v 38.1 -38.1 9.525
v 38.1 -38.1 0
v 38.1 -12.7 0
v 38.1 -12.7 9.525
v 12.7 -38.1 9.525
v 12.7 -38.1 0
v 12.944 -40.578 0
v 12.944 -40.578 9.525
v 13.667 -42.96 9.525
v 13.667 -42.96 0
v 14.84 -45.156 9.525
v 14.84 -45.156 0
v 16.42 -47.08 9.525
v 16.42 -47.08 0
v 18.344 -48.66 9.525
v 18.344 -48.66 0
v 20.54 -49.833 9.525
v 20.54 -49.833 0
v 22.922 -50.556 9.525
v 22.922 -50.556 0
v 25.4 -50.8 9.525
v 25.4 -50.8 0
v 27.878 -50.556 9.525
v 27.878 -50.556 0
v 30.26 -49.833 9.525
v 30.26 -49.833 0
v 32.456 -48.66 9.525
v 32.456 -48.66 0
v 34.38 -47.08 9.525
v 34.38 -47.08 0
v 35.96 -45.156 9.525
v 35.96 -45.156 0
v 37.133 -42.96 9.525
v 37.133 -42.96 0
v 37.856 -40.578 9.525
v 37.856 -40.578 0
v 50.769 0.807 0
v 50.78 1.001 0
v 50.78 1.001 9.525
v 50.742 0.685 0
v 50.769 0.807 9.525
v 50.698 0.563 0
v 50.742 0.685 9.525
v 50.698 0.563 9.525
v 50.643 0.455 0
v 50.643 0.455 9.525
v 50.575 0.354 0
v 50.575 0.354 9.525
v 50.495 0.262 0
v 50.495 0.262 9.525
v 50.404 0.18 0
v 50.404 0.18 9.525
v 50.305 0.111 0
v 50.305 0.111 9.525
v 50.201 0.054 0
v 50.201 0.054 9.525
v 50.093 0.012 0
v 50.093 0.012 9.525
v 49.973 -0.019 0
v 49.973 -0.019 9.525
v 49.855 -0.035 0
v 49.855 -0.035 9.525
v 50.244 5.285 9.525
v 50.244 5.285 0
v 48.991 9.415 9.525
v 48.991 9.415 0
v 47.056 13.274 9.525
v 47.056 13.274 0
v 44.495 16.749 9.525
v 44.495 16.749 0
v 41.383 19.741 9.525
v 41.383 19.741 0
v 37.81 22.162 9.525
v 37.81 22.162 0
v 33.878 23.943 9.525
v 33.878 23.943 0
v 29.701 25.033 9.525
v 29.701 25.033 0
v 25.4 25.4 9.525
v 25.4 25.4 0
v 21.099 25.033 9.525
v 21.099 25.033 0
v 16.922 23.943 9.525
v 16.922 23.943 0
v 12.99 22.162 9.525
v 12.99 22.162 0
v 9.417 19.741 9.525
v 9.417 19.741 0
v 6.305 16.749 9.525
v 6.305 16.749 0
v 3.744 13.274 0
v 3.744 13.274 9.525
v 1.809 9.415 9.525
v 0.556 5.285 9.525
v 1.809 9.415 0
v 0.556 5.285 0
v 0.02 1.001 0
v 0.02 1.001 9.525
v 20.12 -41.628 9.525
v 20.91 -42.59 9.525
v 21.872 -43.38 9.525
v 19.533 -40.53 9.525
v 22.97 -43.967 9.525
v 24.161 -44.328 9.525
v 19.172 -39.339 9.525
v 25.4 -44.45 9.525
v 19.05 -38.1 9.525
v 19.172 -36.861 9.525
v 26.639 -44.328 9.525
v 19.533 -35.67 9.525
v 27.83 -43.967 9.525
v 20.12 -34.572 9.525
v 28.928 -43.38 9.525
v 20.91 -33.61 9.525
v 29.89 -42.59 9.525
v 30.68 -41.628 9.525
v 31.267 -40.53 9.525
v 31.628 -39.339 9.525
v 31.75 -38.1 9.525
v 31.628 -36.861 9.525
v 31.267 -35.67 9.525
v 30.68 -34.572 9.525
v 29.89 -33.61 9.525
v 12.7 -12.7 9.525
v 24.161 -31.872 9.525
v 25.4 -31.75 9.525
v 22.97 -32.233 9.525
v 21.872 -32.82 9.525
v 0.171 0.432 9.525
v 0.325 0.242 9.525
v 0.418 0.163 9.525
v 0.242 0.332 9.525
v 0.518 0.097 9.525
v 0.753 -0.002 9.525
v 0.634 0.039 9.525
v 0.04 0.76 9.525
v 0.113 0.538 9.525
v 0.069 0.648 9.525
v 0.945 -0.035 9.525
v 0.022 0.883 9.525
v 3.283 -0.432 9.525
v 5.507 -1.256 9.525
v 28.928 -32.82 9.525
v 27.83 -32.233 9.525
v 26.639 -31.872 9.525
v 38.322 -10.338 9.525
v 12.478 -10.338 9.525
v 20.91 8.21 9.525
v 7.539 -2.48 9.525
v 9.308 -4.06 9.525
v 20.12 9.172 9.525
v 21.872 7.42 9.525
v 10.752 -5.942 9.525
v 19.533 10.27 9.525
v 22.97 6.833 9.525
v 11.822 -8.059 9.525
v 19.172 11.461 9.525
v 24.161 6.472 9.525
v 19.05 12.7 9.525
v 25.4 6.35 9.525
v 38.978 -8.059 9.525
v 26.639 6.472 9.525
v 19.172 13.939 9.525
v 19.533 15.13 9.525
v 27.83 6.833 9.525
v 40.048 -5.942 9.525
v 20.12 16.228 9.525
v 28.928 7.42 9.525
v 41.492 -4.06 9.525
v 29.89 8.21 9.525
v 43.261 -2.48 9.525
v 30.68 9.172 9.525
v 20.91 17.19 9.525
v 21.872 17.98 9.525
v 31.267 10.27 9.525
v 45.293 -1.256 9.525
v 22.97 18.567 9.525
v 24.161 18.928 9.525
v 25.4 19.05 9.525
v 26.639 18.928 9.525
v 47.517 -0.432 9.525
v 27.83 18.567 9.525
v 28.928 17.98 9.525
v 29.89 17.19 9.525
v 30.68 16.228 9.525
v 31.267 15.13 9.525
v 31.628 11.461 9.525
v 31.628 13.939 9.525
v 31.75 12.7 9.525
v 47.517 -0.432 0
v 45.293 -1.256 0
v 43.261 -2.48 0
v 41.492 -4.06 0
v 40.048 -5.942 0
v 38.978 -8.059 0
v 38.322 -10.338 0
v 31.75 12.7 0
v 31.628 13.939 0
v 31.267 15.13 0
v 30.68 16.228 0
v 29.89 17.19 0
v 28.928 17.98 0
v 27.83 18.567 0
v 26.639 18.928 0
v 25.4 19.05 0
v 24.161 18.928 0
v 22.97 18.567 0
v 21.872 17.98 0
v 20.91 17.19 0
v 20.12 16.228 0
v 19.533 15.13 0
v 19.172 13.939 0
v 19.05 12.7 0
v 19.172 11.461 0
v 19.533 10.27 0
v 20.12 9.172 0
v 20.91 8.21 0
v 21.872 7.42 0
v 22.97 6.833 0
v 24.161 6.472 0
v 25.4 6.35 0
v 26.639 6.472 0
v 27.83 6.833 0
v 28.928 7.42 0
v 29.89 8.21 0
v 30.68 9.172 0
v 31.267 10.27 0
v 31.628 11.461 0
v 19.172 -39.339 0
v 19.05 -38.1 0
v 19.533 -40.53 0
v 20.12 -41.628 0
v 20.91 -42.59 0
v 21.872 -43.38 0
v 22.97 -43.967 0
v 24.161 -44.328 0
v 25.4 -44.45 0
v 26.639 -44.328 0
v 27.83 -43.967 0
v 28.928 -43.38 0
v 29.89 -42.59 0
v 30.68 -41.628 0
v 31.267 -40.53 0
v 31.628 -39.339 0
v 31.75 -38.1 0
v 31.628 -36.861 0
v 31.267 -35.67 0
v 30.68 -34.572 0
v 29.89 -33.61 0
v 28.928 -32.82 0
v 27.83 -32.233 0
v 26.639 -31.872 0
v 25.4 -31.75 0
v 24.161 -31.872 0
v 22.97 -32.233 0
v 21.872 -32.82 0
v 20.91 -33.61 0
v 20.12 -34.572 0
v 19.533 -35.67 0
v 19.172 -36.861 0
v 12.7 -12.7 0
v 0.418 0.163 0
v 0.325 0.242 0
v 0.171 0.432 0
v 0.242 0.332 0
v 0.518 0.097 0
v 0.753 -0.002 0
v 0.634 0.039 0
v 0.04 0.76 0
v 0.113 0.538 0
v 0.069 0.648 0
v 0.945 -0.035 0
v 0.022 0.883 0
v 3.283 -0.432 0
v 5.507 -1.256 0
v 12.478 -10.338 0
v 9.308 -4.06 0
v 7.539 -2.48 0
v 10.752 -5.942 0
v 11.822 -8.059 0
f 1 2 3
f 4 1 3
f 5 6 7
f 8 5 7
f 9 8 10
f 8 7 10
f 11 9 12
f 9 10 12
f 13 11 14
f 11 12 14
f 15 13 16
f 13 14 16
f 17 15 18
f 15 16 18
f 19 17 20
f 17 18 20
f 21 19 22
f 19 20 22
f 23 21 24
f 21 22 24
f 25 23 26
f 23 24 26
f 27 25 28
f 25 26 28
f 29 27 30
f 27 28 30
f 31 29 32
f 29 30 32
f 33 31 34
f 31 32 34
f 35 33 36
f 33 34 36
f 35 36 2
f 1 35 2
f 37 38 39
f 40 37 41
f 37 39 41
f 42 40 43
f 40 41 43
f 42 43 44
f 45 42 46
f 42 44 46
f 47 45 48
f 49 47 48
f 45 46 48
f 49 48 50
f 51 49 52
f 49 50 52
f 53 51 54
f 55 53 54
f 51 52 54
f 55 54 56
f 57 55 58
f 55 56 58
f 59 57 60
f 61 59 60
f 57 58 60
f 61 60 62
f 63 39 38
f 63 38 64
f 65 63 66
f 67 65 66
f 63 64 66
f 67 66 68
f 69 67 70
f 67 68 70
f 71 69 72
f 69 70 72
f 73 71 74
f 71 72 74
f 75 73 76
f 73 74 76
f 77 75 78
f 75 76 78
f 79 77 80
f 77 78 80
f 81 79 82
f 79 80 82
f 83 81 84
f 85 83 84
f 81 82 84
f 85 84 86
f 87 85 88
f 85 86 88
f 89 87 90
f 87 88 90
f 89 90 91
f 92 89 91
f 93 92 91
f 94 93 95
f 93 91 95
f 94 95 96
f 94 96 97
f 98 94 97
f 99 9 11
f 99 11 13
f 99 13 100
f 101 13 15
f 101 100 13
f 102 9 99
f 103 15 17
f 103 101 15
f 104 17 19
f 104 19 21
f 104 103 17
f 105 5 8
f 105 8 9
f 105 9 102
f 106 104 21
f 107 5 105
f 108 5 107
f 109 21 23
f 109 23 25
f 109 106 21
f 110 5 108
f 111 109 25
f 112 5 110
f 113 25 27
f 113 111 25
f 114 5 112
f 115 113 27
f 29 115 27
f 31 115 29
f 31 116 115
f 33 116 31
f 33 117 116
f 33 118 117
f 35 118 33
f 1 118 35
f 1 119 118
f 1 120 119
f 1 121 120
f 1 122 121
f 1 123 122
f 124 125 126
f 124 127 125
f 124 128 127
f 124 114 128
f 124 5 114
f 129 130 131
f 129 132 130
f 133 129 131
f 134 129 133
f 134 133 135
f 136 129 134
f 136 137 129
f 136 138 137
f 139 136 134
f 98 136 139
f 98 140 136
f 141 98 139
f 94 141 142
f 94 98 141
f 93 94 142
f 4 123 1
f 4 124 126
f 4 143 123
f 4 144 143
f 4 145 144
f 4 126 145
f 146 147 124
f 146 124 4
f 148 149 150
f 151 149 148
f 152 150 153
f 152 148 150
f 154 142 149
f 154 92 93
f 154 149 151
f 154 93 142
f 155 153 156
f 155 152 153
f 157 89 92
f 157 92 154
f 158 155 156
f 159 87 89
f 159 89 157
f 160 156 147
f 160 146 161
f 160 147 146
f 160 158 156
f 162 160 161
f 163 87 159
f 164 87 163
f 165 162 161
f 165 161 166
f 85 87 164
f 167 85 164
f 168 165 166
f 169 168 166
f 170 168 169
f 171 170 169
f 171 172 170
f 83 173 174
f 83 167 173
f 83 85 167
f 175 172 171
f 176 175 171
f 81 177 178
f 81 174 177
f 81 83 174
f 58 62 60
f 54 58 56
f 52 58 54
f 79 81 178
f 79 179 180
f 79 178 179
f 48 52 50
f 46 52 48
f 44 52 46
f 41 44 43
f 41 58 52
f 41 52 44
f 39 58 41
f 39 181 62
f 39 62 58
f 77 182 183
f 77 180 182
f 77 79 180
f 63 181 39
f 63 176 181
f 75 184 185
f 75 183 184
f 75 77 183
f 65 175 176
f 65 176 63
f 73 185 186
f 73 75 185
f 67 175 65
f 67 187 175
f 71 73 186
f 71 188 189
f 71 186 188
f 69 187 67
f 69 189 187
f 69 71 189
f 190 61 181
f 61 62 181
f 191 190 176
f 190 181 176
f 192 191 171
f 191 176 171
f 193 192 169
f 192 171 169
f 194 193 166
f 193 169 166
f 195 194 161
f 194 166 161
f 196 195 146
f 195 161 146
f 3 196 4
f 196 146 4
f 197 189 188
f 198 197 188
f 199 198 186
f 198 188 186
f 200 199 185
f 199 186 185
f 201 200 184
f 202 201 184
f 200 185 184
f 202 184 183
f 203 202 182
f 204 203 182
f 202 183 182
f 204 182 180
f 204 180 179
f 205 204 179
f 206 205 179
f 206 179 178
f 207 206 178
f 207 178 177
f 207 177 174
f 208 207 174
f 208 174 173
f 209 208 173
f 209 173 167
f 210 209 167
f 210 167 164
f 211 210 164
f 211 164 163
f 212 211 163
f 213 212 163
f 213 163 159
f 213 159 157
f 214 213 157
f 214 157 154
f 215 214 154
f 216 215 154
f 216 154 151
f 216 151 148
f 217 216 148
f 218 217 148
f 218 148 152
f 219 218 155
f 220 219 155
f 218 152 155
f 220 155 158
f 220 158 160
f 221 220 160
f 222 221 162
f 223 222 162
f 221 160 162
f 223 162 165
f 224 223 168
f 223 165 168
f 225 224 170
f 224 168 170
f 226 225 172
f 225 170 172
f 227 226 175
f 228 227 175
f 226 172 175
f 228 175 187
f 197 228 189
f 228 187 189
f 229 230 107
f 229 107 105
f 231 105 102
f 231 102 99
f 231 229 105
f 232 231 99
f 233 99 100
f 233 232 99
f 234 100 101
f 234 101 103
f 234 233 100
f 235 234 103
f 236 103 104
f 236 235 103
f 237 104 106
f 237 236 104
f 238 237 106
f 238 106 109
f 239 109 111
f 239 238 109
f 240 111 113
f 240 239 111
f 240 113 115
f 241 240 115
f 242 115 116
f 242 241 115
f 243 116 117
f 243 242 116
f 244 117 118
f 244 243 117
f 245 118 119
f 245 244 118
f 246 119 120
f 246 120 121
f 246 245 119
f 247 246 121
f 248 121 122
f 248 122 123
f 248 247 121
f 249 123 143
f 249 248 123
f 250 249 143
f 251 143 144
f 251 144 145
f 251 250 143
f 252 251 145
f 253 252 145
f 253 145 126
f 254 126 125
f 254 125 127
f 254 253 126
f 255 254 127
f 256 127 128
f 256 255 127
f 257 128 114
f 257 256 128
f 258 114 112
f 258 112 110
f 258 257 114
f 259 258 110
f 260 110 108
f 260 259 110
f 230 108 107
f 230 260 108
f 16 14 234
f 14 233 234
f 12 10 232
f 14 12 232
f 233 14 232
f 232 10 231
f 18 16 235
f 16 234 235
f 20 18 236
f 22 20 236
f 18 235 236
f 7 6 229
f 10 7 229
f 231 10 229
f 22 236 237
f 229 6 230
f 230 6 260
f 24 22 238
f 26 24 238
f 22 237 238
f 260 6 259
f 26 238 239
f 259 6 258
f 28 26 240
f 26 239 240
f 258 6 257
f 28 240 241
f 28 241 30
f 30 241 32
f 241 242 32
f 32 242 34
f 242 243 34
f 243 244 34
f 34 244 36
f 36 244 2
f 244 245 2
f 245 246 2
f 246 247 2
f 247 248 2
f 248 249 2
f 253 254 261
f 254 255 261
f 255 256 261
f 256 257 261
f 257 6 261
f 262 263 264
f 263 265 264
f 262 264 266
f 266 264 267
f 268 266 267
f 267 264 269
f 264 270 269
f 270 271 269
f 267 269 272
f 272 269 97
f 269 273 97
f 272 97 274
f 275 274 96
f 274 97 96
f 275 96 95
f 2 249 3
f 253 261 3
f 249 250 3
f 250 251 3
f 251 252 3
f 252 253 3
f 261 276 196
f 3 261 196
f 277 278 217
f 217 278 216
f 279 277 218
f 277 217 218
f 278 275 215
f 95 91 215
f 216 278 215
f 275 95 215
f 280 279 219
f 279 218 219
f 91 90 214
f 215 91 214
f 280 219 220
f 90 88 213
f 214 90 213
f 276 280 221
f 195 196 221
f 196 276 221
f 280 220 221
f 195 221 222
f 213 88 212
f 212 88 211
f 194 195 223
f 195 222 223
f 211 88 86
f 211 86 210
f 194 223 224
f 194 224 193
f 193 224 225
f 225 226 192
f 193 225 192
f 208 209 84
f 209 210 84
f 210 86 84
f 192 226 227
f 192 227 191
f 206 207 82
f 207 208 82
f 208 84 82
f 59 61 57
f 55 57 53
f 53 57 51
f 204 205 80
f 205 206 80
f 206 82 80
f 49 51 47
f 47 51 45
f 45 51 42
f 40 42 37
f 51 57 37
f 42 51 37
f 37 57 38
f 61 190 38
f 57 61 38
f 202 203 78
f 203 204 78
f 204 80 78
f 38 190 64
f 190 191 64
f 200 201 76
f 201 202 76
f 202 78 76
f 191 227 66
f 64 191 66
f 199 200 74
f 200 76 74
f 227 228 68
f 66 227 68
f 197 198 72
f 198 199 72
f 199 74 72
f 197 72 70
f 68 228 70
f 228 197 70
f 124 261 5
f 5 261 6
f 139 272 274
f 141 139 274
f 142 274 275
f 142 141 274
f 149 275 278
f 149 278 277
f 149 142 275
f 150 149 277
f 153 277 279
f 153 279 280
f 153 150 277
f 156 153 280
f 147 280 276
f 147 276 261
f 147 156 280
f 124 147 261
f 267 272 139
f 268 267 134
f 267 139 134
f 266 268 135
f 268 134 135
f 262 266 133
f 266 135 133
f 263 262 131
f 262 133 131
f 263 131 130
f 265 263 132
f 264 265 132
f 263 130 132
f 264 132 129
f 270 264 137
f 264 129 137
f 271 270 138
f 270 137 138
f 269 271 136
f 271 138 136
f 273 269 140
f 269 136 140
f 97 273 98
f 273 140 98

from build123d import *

# Parameters (mm, degrees)
SKETCH1_R           = 6.35
BOSS_EXTRUDE1_DEPTH = 9.525
SKETCH2_R           = 6.35
CUT_EXTRUDE1_DEPTH  = 73.470722537
FILLET1_R           = 12.7
FILLET2_R           = 1


with BuildPart() as part:
    # Sketch1 → Boss-Extrude1 (new body)
    with BuildSketch(Plane.XY):
        with BuildLine():
            Line((0, 0), (12.7, 0))
            Line((12.7, 0), (12.7, -38.1))
            ThreePointArc((12.7, -38.1), (25.4, -50.8), (38.1, -38.1))
            Line((38.1, -38.1), (38.1, 0))
            Line((38.1, 0), (50.8, 0))
            ThreePointArc((50.8, 0), (25.4, 25.4), (0, 0))
        make_face()
        with Locations(Location((25.4, -38.1, 0), (0, 0, 180))):
            Circle(SKETCH1_R, mode=Mode.SUBTRACT)
    extrude(amount=BOSS_EXTRUDE1_DEPTH)

    # Sketch2 → Cut-Extrude1 (cut, through all)
    with BuildSketch(Plane.XY.offset(9.525)):
        with Locations((25.4, 12.7)):
            Circle(SKETCH2_R)
    extrude(amount=-CUT_EXTRUDE1_DEPTH, mode=Mode.SUBTRACT)

    # Fillet1
    fillet1_edges = [part.edges().sort_by_distance(p)[0] for p in [
        (38.1, 0, 4.7625),
        (12.7, 0, 4.7625),
    ]]
    fillet(fillet1_edges, radius=FILLET1_R - 0.0001)  # a hair under: the kernel refuses the full size

    # Fillet2
    fillet2_edges = [part.edges().sort_by_distance(p)[0] for p in [
        (0, 0, 4.7625),
        (50.8, 0, 4.7625),
    ]]
    fillet(fillet2_edges, radius=FILLET2_R)


solid = part.part
